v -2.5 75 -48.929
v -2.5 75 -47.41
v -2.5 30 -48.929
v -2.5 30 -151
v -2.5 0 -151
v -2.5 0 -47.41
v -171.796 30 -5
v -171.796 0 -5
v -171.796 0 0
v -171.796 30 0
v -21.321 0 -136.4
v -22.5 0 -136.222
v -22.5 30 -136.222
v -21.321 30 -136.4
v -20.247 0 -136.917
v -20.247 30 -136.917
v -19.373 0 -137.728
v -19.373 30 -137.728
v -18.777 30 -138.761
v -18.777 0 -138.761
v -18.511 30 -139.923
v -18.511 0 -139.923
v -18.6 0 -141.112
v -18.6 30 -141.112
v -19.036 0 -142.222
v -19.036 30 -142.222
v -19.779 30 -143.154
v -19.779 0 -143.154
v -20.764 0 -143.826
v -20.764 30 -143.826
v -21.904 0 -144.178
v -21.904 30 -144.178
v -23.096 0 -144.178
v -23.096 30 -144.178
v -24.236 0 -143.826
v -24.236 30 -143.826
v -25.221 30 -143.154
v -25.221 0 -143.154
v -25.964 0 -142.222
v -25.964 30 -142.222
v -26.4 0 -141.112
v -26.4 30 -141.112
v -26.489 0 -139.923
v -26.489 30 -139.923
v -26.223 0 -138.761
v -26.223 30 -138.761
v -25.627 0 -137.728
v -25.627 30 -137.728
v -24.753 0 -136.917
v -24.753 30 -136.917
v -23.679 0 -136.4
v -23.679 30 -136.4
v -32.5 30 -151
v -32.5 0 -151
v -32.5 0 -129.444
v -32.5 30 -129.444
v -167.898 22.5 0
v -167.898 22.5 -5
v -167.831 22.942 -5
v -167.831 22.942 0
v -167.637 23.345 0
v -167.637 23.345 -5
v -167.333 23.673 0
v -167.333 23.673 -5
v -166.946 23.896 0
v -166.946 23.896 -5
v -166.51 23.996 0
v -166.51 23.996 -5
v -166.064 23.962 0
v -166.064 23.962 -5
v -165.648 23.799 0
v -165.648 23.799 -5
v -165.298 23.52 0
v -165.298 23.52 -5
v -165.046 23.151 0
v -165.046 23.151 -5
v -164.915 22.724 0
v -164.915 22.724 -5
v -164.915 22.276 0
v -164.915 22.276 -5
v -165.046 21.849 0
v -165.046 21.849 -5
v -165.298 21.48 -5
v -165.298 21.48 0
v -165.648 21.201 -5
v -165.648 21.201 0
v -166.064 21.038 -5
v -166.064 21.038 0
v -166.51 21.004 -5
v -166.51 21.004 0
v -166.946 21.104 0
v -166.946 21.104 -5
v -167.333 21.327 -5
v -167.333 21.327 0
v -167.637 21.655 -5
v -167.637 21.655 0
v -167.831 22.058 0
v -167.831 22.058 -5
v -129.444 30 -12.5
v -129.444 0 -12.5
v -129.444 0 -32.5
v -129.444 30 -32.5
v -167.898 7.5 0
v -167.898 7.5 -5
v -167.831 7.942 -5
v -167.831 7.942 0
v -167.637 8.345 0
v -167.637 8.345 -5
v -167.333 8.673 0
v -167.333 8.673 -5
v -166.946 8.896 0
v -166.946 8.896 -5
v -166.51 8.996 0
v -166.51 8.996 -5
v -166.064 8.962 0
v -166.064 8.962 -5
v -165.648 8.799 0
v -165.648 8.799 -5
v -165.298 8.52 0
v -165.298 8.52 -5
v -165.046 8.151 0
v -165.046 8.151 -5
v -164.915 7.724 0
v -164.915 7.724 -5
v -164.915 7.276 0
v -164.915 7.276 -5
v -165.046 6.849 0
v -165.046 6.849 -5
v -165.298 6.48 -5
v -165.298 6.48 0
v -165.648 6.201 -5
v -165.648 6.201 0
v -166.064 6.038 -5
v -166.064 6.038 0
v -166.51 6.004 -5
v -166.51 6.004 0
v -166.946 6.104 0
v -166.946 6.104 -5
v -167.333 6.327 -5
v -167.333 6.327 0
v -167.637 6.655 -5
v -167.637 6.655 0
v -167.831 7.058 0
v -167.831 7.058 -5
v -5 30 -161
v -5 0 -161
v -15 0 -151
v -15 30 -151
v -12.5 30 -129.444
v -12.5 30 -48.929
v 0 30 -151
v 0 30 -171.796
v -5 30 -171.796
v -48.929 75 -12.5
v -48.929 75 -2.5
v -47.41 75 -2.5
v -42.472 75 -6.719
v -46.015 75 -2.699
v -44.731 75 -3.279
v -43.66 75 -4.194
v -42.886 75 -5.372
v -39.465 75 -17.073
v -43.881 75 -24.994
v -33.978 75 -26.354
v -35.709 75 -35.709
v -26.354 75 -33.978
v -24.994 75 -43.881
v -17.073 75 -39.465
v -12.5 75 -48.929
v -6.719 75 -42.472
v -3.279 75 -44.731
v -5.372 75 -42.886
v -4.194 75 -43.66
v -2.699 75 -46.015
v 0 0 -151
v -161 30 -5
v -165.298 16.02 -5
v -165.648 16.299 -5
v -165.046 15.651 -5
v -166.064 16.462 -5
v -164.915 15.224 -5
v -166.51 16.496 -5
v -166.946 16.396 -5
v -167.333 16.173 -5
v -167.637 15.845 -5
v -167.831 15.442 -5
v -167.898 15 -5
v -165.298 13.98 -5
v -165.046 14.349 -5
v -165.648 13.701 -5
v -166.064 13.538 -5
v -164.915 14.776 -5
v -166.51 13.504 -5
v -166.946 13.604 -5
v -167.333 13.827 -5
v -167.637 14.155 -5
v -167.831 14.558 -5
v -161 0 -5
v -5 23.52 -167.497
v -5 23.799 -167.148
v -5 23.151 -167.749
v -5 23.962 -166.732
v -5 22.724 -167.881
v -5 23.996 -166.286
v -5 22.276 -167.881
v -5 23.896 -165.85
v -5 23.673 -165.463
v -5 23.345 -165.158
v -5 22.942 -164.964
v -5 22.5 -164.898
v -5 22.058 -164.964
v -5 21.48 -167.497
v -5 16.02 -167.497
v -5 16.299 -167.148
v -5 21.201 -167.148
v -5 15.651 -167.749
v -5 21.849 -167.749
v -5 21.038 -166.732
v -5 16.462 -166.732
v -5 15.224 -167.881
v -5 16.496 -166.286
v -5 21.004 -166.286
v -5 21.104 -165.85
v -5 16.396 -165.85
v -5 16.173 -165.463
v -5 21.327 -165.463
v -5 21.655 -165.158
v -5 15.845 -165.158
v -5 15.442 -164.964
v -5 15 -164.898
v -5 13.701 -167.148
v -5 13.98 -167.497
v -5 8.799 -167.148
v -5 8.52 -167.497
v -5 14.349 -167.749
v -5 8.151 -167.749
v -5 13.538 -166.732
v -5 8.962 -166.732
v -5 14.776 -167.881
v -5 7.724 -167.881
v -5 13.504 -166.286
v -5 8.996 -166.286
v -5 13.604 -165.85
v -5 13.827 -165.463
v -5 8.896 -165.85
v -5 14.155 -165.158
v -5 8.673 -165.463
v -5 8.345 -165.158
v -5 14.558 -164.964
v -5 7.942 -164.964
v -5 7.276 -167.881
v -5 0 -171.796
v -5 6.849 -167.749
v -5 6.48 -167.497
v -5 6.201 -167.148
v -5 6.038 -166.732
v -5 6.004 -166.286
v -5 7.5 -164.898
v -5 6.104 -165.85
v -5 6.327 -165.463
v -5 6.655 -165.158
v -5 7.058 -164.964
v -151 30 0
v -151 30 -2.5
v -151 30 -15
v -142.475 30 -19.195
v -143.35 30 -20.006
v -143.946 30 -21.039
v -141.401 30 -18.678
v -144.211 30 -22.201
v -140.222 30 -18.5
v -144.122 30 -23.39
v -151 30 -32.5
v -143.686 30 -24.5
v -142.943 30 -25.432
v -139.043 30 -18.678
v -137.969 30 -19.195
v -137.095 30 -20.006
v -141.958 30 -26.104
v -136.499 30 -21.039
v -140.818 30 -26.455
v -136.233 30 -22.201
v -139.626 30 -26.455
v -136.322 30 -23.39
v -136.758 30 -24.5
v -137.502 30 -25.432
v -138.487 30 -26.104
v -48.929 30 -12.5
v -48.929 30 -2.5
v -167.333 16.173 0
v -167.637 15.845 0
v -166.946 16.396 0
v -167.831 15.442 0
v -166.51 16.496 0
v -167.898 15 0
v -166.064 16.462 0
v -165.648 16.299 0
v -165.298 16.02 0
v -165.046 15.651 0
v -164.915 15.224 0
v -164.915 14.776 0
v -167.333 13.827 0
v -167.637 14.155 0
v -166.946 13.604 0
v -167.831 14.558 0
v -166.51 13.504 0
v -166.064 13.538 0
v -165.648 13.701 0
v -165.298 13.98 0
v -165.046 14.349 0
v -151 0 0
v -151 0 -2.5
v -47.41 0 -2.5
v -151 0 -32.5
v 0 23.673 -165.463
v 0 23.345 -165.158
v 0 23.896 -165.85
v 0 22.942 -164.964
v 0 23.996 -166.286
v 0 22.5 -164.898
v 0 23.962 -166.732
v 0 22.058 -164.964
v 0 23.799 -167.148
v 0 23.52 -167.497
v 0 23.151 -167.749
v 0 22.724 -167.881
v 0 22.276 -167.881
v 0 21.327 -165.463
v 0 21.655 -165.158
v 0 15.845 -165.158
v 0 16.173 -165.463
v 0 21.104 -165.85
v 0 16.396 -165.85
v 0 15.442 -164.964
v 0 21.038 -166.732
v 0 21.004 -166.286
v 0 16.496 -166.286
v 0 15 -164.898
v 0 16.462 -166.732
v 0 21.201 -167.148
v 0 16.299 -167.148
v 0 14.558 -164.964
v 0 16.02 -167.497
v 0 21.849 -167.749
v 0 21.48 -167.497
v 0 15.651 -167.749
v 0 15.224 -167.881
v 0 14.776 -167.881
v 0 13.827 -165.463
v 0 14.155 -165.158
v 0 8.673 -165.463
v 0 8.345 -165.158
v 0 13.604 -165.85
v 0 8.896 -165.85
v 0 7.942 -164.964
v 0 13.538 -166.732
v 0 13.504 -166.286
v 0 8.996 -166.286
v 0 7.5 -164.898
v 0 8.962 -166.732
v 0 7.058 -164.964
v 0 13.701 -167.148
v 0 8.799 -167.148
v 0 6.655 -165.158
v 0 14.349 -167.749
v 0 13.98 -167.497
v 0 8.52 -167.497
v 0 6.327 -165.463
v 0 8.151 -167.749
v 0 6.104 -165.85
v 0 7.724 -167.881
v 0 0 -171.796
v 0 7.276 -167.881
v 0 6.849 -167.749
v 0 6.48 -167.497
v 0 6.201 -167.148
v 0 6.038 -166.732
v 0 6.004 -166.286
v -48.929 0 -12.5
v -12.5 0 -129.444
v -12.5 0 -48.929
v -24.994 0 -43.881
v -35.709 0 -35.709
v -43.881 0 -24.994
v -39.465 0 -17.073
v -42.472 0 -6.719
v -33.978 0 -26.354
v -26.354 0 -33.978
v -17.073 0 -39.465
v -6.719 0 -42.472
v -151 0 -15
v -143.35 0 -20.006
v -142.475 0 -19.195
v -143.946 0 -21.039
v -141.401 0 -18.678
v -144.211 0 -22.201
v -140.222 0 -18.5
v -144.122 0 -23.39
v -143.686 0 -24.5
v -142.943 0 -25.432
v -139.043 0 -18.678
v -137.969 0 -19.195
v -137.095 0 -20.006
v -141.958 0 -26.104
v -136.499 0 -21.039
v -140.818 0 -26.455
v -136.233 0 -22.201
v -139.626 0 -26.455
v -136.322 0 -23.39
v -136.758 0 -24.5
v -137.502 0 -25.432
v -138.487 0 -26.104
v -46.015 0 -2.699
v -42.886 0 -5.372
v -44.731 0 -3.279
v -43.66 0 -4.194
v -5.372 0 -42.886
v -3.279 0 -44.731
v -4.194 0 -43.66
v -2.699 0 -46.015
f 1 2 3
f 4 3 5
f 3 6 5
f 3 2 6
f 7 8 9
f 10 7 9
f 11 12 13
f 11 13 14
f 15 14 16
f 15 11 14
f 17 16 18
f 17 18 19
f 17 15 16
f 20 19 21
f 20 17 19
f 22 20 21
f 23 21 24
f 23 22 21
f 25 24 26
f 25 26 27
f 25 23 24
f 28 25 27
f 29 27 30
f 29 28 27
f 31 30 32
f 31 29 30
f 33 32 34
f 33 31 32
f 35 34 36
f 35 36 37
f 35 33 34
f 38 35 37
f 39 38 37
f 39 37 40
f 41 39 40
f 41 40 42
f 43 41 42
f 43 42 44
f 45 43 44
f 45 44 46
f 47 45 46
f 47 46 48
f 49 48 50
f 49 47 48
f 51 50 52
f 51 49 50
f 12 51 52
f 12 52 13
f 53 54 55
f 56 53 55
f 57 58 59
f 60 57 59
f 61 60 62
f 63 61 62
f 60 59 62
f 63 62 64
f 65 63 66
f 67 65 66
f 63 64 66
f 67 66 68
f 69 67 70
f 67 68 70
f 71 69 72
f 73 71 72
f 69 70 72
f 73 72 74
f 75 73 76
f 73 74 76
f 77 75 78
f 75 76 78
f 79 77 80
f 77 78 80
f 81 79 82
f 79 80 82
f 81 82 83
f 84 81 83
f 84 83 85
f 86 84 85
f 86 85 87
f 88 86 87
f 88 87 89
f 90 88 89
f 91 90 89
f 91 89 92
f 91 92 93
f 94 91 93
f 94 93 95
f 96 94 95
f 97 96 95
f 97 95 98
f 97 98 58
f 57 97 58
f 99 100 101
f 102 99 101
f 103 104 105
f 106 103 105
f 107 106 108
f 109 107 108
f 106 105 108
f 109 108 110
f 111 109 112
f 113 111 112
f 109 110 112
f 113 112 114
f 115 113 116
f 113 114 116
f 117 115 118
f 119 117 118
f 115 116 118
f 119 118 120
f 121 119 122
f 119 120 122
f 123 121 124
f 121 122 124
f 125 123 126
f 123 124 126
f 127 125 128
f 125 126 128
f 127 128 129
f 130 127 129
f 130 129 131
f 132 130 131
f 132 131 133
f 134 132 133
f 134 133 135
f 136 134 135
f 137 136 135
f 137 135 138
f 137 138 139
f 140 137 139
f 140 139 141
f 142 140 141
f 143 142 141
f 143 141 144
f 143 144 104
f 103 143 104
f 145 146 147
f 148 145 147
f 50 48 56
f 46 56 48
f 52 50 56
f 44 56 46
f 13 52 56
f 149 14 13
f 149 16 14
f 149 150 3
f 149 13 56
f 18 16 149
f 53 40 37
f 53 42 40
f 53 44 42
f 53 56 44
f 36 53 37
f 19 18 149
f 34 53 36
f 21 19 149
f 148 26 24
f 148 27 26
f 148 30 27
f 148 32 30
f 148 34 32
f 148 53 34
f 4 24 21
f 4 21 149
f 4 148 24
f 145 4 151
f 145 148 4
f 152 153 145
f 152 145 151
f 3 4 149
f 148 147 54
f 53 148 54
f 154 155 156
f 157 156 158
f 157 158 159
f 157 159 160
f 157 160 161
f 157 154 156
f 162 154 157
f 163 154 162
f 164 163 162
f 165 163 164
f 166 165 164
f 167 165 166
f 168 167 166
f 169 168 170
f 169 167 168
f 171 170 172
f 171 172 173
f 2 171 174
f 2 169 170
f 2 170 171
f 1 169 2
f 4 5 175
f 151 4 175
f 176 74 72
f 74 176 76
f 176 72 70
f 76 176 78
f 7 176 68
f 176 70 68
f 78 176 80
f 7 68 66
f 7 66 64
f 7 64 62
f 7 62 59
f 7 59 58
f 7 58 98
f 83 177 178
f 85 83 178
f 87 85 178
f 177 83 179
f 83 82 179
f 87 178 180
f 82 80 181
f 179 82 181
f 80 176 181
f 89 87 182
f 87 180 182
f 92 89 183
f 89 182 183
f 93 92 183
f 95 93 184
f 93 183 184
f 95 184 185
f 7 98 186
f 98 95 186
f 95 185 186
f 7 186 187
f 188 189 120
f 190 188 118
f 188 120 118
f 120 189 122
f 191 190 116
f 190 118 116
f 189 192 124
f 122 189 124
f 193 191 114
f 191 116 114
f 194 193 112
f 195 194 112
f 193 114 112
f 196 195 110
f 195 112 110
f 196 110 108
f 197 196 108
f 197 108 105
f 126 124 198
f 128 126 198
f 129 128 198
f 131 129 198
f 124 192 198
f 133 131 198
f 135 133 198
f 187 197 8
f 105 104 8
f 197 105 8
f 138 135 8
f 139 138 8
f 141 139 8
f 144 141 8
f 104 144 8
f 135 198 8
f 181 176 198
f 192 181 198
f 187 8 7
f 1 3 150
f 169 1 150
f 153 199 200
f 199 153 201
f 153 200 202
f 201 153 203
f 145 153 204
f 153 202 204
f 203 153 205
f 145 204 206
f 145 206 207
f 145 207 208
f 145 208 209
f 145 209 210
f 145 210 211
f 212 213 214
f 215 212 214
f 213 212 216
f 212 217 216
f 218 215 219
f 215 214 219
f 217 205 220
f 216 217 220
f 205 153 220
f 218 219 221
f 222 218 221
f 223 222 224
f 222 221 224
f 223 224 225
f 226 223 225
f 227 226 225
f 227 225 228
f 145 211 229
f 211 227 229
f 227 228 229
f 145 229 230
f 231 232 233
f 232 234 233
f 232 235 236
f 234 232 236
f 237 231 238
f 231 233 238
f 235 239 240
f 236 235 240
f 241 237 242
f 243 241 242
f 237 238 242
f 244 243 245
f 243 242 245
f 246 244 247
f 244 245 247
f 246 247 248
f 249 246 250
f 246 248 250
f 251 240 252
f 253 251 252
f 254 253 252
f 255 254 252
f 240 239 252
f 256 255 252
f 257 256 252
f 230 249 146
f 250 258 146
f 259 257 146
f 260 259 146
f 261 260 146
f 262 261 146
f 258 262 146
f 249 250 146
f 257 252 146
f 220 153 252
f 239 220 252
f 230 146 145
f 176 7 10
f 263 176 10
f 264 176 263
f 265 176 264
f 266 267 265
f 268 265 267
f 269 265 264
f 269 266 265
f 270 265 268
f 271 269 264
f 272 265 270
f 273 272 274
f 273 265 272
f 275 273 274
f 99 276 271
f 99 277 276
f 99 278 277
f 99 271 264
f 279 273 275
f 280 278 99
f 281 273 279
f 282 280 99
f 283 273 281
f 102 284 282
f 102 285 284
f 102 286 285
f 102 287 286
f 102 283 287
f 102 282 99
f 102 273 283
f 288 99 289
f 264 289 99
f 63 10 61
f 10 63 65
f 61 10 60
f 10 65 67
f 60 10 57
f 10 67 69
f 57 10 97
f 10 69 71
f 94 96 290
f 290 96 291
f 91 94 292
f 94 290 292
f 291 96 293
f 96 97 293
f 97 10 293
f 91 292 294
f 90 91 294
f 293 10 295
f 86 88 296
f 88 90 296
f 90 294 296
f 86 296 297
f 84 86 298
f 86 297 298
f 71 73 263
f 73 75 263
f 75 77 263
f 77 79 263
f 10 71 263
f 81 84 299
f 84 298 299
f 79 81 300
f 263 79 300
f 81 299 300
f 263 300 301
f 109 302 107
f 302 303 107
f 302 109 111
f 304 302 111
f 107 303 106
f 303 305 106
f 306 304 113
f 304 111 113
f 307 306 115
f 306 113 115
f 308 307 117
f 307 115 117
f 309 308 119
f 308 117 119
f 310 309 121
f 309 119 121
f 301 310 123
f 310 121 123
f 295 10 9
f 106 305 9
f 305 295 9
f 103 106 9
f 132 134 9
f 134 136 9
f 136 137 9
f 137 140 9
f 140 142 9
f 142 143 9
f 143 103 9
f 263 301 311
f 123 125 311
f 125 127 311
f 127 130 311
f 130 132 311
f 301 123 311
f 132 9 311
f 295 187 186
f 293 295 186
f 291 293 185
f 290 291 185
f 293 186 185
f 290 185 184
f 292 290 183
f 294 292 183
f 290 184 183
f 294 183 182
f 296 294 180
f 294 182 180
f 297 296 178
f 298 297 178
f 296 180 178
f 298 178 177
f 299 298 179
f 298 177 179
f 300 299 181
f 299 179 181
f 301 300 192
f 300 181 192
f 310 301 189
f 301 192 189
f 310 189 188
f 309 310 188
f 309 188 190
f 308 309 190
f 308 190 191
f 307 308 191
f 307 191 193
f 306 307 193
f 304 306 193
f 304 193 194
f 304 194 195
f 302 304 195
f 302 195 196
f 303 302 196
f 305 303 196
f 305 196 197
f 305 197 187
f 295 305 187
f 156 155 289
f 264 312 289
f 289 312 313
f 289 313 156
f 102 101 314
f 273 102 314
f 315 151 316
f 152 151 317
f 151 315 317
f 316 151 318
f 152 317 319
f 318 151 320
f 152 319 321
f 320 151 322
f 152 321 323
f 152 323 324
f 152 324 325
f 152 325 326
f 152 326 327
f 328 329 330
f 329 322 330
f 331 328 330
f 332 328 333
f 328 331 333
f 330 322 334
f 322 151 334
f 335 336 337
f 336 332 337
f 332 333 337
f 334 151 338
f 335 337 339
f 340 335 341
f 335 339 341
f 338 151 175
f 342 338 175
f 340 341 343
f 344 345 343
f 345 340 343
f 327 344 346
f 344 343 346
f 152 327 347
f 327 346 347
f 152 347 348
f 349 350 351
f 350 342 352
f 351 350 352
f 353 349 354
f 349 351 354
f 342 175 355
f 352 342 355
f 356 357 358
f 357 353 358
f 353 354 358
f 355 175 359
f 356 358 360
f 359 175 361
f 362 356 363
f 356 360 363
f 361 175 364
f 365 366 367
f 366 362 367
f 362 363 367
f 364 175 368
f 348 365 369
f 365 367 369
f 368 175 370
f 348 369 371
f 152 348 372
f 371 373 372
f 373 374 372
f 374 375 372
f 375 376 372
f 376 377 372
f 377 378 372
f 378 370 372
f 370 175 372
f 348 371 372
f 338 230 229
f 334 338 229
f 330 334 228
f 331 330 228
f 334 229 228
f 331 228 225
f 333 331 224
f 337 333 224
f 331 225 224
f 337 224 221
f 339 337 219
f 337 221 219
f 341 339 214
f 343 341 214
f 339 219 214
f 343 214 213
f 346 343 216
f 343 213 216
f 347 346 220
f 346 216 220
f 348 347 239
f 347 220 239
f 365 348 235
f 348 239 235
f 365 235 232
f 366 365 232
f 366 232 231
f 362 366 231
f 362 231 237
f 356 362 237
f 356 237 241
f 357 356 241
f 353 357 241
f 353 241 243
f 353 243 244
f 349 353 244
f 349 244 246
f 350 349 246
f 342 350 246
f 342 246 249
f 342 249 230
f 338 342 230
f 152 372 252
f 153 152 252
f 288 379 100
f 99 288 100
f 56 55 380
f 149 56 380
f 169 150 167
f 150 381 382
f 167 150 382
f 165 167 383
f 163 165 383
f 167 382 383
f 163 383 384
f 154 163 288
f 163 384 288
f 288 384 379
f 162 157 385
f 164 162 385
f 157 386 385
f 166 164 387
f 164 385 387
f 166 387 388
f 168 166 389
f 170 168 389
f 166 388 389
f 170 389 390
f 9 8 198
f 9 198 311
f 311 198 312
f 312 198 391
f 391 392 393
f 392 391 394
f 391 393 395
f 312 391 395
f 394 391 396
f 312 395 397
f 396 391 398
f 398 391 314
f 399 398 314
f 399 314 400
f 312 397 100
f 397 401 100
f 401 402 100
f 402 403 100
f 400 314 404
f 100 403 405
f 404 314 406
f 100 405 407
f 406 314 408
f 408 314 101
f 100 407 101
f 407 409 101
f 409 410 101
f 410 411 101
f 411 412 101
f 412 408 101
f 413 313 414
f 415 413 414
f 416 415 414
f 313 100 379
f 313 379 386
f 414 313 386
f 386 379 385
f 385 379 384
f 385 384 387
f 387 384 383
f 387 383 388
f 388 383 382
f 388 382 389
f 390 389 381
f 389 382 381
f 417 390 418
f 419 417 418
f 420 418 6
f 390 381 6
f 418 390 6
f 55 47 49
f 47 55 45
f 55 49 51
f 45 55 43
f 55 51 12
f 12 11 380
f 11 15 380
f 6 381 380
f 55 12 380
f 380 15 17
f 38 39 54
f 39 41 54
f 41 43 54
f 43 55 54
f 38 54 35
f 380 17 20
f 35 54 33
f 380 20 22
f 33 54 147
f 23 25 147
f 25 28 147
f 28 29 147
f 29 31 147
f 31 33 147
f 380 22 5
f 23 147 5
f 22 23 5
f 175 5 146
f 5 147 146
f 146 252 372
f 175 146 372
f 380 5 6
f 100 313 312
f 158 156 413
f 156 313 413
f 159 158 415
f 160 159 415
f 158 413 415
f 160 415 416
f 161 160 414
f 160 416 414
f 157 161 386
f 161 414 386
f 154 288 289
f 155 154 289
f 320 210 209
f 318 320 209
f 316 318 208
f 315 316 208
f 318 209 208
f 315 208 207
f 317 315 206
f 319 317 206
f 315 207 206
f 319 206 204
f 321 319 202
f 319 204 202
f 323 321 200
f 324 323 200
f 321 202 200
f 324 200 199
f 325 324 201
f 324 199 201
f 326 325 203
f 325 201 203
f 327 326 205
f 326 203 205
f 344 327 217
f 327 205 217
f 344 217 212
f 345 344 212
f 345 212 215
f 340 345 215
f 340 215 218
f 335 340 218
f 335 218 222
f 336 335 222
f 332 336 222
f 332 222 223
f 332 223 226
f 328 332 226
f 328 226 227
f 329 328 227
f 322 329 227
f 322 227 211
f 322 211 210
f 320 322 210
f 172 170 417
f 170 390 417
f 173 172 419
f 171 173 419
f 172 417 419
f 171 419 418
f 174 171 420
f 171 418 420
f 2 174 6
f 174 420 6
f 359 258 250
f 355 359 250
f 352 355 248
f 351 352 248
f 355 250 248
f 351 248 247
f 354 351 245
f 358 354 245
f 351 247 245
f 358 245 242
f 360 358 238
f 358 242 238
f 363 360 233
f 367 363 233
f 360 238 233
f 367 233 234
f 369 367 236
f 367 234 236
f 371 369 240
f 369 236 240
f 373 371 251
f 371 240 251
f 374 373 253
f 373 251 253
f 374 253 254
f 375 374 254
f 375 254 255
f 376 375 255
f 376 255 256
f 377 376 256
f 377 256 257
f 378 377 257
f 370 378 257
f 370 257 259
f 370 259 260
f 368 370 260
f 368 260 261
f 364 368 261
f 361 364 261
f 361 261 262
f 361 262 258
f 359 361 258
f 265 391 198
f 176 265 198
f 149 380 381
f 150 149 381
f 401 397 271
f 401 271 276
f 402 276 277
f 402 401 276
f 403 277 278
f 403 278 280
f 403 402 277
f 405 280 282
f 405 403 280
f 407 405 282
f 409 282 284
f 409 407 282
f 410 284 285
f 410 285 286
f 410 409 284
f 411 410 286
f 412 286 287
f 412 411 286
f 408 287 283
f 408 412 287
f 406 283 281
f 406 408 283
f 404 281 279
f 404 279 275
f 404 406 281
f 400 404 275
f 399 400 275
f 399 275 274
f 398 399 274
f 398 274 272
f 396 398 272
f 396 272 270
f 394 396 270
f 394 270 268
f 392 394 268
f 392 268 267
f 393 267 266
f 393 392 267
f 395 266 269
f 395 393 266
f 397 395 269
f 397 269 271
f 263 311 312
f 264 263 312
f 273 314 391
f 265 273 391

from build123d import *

# Parameters (mm, degrees)
SKETCH2_R           = 4
BOSS_EXTRUDE1_DEPTH = 30
SKETCH10_R          = 1.5
CUT_EXTRUDE1_DEPTH  = 10
SKETCH11_R          = 1.5
CUT_EXTRUDE3_DEPTH  = 10
BOSS_EXTRUDE2_DEPTH = 45


with BuildPart() as part:
    # Sketch2 → Boss-Extrude1 (new body)
    with BuildSketch(Plane(origin=(0, 0, 0), x_dir=(1, 0, 0), z_dir=(0, 1, 0))):
        with BuildLine():
            Line((-2.5, 47.410441888), (-2.5, 49.444413233))
            Line((-2.5, 49.444413233), (-2.5, 151))
            Line((-2.5, 151), (0, 151))
            Line((0, 151), (0, 171.795711314))
            Line((0, 171.795711314), (-5, 171.795711314))
            Line((-5, 171.795711314), (-5, 161))
            Line((-5, 161), (-15, 151))
            Line((-15, 151), (-32.5, 151))
            Line((-32.5, 151), (-32.5, 129.444413233))
            Line((-32.5, 129.444413233), (-12.5, 129.444413233))
            Line((-12.5, 129.444413233), (-12.5, 48.928519291))
            ThreePointArc((-12.5, 48.928519291), (-35.70889245, 35.70889245), (-48.928519291, 12.5))
            Line((-48.928519291, 12.5), (-129.444413233, 12.5))
            Line((-129.444413233, 12.5), (-129.444413233, 32.5))
            Line((-129.444413233, 32.5), (-151, 32.5))
            Line((-151, 32.5), (-151, 15))
            Line((-151, 15), (-161, 5))
            Line((-161, 5), (-171.795711314, 5))
            Line((-171.795711314, 5), (-171.795711314, 0))
            Line((-171.795711314, 0), (-151, 0))
            Line((-151, 0), (-151, 2.5))
            Line((-151, 2.5), (-49.444413233, 2.5))
            Line((-49.444413233, 2.5), (-47.410441888, 2.5))
            ThreePointArc((-47.410441888, 2.5), (-44.162846624, 3.698273419), (-42.471854191, 6.71875))
            ThreePointArc((-42.471854191, 6.71875), (-30.405591591, 30.405591591), (-6.71875, 42.471854191))
            ThreePointArc((-6.71875, 42.471854191), (-3.698273419, 44.162846624), (-2.5, 47.410441888))
        make_face()
        with Locations(Location((-22.5, 140.222206617, 0), (0, 0, 270))):
            Circle(SKETCH2_R, mode=Mode.SUBTRACT)
        with Locations(Location((-140.222206617, 22.5, 0), (0, 0, 270))):
            Circle(SKETCH2_R, mode=Mode.SUBTRACT)
    extrude(amount=BOSS_EXTRUDE1_DEPTH)

    # Sketch10 → Cut-Extrude1 (cut)
    with BuildSketch(Plane.ZY.offset(5)):
        with Locations((-166.397855657, 22.5)):
            Circle(SKETCH10_R)
        with Locations((-166.397855657, 15)):
            Circle(SKETCH10_R)
        with Locations((-166.397855657, 7.5)):
            Circle(SKETCH10_R)
    extrude(amount=-CUT_EXTRUDE1_DEPTH, mode=Mode.SUBTRACT)

    # Sketch11 → Cut-Extrude3 (cut)
    with BuildSketch(Plane(origin=(0, 0, -5), x_dir=(-1, 0, 0), z_dir=(0, 0, -1))):
        with Locations((166.397855657, 22.5)):
            Circle(SKETCH11_R)
        with Locations((166.397855657, 15)):
            Circle(SKETCH11_R)
        with Locations((166.397855657, 7.5)):
            Circle(SKETCH11_R)
    extrude(amount=-CUT_EXTRUDE3_DEPTH, mode=Mode.SUBTRACT)

    # Sketch13 → Boss-Extrude2 (add)
    with BuildSketch(Plane(origin=(0, 30, 0), x_dir=(1, 0, 0), z_dir=(0, 1, 0))):
        with BuildLine():
            Line((-48.928519291, 12.5), (-48.928519291, 2.5))
            Line((-48.928519291, 2.5), (-47.410441888, 2.5))
            ThreePointArc((-47.410441888, 2.5), (-44.162846624, 3.698273419), (-42.471854191, 6.71875))
            ThreePointArc((-42.471854191, 6.71875), (-30.405591591, 30.405591591), (-6.71875, 42.471854191))
            ThreePointArc((-6.71875, 42.471854191), (-3.698273419, 44.162846624), (-2.5, 47.410441888))
            Line((-2.5, 47.410441888), (-2.5, 48.928519291))
            Line((-2.5, 48.928519291), (-12.5, 48.928519291))
            ThreePointArc((-12.5, 48.928519291), (-35.70889245, 35.70889245), (-48.928519291, 12.5))
        make_face()
    extrude(amount=BOSS_EXTRUDE2_DEPTH)


solid = part.part
